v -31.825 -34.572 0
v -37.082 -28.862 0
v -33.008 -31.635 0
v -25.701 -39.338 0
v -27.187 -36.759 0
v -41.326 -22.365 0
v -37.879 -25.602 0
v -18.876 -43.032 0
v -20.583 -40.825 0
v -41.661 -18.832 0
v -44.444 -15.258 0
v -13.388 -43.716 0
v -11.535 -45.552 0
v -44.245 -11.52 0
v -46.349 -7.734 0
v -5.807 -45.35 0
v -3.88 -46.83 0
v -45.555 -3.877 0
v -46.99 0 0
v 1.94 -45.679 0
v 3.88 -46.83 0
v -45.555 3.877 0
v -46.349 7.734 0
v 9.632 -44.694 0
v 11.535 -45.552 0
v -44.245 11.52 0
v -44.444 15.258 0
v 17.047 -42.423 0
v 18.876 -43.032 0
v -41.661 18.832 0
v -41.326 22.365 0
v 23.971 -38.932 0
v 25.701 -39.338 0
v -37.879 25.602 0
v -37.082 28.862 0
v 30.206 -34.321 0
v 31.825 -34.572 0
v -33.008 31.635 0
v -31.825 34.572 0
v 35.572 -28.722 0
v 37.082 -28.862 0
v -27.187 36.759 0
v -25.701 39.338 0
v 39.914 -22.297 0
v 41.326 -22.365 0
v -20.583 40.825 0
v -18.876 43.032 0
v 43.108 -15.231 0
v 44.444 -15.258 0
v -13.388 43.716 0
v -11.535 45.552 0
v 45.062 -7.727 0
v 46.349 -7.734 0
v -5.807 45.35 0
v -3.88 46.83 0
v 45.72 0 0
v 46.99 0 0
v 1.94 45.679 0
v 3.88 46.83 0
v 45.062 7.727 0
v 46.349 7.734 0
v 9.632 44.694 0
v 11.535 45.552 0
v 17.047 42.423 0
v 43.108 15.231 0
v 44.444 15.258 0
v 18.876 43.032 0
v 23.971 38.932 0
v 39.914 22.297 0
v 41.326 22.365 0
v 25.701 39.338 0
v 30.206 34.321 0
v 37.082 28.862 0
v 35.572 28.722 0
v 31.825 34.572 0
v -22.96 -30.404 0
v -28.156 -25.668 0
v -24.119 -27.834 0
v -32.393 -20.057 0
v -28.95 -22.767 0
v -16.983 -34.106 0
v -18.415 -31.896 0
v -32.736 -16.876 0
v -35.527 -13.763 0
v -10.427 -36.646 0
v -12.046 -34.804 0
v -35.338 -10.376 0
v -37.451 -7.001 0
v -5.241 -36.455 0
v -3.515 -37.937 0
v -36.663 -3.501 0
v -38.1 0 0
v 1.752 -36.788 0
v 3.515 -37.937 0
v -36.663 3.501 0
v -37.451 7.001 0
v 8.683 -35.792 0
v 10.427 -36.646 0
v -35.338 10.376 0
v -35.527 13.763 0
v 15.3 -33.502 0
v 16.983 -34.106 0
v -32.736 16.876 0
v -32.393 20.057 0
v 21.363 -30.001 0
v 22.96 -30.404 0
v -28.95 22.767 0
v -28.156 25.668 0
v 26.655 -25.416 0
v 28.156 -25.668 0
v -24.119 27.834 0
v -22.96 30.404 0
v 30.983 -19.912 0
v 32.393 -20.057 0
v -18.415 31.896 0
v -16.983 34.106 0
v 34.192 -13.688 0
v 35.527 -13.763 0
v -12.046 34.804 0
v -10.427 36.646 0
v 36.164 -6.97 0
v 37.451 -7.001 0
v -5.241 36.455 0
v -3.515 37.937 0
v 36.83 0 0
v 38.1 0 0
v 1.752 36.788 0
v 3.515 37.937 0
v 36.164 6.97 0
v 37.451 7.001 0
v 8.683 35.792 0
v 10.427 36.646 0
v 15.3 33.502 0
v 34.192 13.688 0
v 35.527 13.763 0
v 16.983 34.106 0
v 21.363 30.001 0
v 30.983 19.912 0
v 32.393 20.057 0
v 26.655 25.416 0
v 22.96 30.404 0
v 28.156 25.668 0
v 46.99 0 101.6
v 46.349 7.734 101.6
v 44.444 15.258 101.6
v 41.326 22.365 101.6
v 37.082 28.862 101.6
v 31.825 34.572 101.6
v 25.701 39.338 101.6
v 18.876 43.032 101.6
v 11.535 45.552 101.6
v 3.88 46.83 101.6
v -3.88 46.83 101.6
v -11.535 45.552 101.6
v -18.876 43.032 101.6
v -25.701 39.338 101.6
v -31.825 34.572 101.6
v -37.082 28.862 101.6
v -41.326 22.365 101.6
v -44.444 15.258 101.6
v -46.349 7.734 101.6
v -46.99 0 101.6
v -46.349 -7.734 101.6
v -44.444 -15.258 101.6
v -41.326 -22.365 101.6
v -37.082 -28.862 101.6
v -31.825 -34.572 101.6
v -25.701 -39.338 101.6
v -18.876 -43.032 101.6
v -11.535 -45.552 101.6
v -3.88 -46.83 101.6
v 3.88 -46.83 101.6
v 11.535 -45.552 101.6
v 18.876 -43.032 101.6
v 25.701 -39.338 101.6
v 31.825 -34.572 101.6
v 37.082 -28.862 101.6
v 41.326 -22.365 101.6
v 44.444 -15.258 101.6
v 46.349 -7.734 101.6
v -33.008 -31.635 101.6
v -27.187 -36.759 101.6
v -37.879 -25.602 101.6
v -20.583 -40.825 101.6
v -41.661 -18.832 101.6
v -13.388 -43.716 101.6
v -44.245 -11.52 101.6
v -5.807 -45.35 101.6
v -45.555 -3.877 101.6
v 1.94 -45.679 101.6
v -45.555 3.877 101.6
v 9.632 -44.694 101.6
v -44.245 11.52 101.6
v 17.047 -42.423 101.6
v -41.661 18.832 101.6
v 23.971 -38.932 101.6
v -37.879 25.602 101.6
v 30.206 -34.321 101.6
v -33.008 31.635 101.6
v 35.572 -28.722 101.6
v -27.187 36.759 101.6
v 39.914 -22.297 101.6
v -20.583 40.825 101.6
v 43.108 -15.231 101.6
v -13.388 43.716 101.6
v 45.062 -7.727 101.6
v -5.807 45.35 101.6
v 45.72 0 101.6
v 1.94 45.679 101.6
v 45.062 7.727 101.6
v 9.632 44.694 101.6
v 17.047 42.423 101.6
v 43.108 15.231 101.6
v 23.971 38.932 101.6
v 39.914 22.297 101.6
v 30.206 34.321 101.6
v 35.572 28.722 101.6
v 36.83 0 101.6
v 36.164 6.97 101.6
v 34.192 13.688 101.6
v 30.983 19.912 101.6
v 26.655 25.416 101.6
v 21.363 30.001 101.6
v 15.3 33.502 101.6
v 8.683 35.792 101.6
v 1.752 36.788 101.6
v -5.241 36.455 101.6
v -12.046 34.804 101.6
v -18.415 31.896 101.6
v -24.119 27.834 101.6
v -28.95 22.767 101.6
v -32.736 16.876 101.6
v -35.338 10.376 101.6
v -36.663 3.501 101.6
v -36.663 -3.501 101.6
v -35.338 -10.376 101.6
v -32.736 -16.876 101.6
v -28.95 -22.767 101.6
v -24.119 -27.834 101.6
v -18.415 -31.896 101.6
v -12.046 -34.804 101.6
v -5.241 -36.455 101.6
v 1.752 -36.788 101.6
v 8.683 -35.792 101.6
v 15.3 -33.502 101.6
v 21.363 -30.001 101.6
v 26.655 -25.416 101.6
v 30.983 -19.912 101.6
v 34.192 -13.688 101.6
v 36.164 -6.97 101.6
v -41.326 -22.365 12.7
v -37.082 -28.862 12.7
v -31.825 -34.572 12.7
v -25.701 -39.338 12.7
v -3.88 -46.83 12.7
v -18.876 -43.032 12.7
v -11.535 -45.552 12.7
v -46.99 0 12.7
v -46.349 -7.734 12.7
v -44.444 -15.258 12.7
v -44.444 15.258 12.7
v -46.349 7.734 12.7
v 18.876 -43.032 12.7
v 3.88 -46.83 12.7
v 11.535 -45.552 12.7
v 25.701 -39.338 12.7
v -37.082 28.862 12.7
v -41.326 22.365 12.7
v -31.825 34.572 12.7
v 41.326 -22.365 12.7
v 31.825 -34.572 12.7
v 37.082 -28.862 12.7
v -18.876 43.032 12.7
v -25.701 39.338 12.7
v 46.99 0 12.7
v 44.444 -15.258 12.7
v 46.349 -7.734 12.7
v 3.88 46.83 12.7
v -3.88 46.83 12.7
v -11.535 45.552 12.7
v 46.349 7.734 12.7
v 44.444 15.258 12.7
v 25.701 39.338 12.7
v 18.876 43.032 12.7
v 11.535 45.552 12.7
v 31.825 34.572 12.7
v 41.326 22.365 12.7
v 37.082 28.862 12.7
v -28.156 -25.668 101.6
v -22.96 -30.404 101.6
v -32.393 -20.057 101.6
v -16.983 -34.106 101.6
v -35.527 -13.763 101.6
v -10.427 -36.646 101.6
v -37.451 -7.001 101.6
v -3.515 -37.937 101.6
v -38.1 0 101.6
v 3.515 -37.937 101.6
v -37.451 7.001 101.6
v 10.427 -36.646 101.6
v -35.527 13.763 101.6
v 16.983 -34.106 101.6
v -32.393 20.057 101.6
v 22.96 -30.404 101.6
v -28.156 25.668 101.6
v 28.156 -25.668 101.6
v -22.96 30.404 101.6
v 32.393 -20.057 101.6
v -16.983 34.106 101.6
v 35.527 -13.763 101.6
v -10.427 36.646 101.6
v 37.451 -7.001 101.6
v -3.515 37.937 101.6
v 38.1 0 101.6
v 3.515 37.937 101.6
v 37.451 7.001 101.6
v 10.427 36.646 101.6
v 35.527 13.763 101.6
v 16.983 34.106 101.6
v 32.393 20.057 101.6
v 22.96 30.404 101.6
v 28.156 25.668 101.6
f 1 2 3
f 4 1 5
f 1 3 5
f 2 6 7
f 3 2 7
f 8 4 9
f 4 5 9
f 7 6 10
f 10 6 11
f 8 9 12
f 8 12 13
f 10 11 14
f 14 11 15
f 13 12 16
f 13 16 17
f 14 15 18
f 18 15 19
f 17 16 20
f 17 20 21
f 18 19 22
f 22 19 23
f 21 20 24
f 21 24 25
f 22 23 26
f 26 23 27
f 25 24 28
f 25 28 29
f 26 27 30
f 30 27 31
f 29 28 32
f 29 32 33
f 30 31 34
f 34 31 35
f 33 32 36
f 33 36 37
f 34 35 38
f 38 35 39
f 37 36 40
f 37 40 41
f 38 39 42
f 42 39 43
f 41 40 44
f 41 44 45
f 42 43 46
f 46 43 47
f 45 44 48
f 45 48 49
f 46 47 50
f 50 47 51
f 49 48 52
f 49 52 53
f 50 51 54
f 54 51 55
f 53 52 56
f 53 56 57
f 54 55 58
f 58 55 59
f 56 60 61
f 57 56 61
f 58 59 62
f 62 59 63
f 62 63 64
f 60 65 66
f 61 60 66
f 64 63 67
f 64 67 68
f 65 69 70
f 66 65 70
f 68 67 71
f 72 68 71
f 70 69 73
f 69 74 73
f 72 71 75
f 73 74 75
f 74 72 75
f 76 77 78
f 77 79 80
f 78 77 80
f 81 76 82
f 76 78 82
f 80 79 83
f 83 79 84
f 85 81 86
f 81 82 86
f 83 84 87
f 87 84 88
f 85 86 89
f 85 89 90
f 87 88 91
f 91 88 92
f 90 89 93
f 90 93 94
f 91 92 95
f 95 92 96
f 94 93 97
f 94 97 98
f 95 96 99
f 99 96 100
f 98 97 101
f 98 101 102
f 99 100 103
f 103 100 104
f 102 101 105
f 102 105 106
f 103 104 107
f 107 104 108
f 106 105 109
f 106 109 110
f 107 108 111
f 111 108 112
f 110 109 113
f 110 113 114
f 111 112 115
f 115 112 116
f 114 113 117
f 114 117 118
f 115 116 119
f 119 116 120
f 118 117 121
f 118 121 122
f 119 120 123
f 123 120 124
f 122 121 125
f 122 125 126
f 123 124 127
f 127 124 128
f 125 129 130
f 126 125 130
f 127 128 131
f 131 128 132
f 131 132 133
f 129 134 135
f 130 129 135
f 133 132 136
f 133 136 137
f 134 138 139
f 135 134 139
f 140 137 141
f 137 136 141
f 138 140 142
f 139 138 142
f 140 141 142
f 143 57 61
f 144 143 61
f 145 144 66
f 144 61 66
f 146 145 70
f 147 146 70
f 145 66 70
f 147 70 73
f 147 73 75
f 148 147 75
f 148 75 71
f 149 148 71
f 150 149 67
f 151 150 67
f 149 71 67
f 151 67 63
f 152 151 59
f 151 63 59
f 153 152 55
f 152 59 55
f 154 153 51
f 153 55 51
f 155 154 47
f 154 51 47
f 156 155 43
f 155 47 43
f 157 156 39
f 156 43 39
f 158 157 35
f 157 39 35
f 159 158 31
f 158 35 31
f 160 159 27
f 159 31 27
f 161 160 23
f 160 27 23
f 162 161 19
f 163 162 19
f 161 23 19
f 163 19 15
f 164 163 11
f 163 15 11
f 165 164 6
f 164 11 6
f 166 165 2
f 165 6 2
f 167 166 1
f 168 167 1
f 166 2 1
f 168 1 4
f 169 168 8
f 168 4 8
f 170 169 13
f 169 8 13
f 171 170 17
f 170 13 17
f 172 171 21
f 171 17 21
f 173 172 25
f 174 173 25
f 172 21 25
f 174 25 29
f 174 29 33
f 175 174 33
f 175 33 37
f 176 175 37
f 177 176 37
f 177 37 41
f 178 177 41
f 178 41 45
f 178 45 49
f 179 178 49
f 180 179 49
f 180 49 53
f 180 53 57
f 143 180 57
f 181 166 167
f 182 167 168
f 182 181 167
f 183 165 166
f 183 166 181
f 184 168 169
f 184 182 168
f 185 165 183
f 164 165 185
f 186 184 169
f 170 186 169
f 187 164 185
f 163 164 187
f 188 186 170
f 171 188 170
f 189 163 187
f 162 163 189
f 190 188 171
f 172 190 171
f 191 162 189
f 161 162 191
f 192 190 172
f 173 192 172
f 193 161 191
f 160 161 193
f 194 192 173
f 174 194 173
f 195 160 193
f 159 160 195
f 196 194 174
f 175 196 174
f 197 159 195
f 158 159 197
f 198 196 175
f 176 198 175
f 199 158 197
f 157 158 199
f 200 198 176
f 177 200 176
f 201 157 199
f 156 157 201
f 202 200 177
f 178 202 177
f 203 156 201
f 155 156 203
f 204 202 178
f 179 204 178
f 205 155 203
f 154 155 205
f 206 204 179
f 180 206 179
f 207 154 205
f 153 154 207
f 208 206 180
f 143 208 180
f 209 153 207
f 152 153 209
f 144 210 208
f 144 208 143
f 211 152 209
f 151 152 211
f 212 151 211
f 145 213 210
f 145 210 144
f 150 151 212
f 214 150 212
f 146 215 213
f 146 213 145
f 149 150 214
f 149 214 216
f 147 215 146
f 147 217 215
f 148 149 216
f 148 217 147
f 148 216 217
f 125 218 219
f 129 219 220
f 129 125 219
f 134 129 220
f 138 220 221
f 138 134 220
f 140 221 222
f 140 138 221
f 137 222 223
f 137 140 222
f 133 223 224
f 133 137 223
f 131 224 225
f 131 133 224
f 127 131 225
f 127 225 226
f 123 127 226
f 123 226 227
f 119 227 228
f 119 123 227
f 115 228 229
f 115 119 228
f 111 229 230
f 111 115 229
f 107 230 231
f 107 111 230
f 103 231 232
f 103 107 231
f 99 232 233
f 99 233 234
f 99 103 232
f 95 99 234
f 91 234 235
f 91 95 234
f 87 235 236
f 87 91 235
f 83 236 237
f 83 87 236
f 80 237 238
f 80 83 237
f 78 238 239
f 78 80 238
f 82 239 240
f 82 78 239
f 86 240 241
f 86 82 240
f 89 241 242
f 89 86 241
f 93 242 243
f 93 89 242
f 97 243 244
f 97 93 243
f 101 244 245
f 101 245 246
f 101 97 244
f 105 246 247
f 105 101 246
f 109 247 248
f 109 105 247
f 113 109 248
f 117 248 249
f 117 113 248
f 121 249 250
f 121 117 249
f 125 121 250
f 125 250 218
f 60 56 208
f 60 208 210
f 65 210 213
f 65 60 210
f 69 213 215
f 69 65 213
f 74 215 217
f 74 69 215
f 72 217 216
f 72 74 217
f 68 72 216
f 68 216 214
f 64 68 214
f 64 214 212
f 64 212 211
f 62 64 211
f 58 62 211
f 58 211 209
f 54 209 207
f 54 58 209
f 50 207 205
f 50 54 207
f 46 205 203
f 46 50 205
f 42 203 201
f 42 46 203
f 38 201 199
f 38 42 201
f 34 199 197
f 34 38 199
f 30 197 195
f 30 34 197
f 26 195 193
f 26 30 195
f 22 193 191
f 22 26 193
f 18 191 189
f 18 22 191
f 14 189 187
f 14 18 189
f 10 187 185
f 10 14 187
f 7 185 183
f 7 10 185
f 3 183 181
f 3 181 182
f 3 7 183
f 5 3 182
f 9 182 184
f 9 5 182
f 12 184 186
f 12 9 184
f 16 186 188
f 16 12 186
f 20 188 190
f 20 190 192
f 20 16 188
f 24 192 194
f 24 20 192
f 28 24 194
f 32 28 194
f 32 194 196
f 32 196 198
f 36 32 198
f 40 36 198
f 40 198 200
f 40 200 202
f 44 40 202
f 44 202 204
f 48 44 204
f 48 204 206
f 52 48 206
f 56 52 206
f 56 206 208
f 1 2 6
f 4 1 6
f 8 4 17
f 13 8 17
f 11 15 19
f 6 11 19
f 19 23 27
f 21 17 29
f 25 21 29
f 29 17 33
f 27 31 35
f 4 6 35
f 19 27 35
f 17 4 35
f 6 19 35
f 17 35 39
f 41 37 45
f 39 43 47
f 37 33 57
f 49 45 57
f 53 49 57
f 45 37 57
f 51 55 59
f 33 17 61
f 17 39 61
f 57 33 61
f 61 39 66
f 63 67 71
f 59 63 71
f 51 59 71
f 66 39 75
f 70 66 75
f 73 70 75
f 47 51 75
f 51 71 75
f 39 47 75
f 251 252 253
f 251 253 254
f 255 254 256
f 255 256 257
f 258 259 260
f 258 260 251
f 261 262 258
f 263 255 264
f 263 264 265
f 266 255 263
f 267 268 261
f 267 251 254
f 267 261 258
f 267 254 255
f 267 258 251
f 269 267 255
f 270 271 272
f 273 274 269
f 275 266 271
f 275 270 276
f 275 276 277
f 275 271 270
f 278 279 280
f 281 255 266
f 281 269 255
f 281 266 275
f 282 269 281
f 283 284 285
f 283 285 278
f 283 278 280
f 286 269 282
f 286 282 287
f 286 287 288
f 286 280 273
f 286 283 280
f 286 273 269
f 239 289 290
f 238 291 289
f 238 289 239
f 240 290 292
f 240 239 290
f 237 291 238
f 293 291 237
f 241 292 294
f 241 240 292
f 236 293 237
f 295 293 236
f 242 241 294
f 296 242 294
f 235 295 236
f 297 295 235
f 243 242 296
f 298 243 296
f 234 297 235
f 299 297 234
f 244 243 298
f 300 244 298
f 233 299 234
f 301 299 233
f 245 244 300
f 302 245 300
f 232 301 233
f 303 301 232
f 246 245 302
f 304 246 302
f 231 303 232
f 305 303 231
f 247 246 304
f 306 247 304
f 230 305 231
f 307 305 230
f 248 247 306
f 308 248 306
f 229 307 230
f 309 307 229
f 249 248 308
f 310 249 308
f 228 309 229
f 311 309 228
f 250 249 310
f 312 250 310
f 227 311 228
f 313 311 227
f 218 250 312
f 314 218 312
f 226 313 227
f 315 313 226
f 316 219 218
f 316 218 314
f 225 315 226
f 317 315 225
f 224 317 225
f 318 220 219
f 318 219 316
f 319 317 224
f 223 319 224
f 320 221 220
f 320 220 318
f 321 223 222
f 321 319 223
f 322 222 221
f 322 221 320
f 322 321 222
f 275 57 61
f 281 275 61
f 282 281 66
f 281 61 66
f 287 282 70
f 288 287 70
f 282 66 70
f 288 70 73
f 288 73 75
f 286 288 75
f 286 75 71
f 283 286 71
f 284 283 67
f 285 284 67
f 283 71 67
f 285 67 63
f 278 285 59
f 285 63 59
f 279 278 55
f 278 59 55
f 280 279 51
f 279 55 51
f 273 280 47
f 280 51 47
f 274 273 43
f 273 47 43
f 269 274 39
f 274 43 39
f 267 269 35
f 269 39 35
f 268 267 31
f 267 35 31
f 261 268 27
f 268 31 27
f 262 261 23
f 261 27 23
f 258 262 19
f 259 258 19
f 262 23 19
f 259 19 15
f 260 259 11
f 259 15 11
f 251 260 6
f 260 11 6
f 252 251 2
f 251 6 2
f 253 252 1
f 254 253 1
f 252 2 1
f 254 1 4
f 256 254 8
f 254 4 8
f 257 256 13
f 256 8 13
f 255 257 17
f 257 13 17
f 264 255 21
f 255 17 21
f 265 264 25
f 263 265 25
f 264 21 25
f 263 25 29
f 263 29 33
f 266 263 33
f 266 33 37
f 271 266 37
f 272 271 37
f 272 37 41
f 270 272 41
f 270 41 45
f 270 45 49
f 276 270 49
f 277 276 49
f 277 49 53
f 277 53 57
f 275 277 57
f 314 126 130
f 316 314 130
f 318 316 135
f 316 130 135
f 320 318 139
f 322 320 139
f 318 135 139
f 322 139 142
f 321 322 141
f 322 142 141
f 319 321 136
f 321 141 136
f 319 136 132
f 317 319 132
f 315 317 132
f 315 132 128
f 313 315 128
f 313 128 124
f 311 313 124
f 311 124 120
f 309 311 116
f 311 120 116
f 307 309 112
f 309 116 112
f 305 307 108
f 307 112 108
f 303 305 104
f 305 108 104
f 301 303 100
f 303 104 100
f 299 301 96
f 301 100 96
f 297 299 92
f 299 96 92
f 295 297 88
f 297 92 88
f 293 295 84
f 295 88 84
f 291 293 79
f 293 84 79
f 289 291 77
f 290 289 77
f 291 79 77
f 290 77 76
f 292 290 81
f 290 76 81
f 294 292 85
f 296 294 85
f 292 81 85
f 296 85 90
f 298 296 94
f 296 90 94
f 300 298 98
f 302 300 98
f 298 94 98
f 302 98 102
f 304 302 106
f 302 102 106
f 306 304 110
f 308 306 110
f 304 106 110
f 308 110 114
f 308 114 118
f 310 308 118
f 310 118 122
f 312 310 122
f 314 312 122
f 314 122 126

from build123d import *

# Parameters (mm, degrees)
F0_R     = 46.99
F0_R_2   = 45.72
F1_DEPTH = 101.6
F2_R     = 38.1
F2_R_2   = 36.83
F3_DEPTH = 101.6
F4_R     = 46.99
F5_DEPTH = 12.7


with BuildPart() as f1:
    # F0 (on Top) → F1 (new body)
    with BuildSketch(Plane.XY):
        Circle(F0_R)
        Circle(F0_R_2, mode=Mode.SUBTRACT)
    extrude(amount=F1_DEPTH)


with BuildPart() as f3:
    # F2 (on Top) → F3 (new body)
    with BuildSketch(Plane.XY):
        Circle(F2_R)
        Circle(F2_R_2, mode=Mode.SUBTRACT)
    extrude(amount=F3_DEPTH)


with BuildPart() as f5:
    # F4 (on Top) → F5 (new body)
    with BuildSketch(Plane.XY):
        Circle(F4_R)
    extrude(amount=F5_DEPTH)


solid = Compound([f1.part, f3.part, f5.part])
